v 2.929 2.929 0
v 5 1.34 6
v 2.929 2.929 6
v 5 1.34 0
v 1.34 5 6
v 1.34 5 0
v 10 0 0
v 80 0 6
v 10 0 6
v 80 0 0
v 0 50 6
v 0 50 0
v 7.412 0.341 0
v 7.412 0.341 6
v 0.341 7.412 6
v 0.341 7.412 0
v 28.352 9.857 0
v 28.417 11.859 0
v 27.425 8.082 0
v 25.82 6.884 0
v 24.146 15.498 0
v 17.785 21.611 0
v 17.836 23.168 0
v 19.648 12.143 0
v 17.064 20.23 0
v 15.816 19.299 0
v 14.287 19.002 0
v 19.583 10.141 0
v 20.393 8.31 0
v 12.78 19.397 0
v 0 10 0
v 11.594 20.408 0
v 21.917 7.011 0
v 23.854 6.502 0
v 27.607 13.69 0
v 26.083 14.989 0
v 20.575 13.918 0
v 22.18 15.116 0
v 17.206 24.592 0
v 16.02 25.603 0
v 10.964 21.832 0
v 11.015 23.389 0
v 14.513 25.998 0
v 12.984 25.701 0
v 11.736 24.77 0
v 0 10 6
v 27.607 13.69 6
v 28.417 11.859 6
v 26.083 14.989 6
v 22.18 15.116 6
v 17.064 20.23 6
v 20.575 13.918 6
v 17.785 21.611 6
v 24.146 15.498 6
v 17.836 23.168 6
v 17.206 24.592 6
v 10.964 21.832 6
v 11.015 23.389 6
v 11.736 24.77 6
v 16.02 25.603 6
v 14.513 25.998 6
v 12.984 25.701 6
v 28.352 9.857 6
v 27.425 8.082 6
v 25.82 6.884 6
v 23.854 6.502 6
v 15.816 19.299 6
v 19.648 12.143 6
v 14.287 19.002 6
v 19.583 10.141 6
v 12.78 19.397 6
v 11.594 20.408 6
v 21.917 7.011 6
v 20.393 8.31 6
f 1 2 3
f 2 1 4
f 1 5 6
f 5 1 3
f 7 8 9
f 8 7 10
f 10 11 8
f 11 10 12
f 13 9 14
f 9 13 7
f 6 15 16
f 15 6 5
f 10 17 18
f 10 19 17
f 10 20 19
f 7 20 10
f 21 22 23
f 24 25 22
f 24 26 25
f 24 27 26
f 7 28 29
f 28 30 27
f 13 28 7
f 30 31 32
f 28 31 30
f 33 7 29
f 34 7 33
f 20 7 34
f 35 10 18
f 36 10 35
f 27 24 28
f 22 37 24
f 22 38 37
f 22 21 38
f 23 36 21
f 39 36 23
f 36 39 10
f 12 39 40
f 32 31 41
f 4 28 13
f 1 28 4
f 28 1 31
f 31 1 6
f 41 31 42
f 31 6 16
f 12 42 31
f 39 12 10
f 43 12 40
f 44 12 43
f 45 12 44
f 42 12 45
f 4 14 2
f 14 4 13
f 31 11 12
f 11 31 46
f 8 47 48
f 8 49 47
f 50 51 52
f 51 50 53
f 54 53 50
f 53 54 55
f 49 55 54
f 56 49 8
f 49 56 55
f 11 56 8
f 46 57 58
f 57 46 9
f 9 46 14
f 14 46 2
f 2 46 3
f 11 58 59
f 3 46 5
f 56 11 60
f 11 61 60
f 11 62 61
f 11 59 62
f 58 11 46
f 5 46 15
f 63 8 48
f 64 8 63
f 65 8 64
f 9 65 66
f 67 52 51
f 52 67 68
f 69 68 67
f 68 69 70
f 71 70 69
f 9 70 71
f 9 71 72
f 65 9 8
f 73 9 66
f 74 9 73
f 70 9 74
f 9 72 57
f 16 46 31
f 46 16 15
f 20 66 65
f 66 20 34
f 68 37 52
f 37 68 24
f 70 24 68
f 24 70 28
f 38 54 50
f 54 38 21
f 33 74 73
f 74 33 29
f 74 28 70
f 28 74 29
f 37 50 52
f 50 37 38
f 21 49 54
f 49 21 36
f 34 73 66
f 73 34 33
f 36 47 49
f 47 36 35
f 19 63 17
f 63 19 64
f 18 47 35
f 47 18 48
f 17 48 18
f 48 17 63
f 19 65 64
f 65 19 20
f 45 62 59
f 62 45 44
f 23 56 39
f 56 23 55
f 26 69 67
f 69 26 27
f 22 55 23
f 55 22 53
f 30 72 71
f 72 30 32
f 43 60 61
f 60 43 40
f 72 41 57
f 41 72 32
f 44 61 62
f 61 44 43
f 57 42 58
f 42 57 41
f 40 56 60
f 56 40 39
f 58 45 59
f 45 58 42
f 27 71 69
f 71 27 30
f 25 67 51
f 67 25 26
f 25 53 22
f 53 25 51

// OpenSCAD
$fn = 32;

// ----------------------------------------------------------------------
// Bracket plate: corner pad 80 x 50, fillet R10
// ----------------------------------------------------------------------

// --- parameters (mm) ---
hole_r = 3.5;             // bolt hole radius
plate_t = 6;              // plate thickness, Z (extrusion height)
leg_a = 80;               // base leg
leg_b = 50;               // height leg
fillet_r = 10;            // right-angle fillet radius

hole_d1 = 2 * hole_r + 2;
hole_d2 = 2 * hole_r;

profile = [[10, 0], [80, 0], [0, 50], [0, 10], [0.341, 7.412], [1.34, 5], [2.929, 2.929], [5, 1.34], [7.412, 0.341]];  // primary outline, 9 points, counter clockwise
void_1 = [[28.417, 11.859], [27.607, 13.69], [26.083, 14.989], [24.146, 15.498], [22.18, 15.116], [20.575, 13.918], [19.648, 12.143], [19.583, 10.141], [20.393, 8.31], [21.917, 7.011], [23.854, 6.502], [25.82, 6.884], [27.425, 8.082], [28.352, 9.857]];  // mount hole 1, 14 points
void_2 = [[17.836, 23.168], [17.206, 24.592], [16.02, 25.603], [14.513, 25.998], [12.984, 25.701], [11.736, 24.77], [11.015, 23.389], [10.964, 21.832], [11.594, 20.408], [12.78, 19.397], [14.287, 19.002], [15.816, 19.299], [17.064, 20.23], [17.785, 21.611]];  // mount hole 2, 14 points

// --- the one profile operation ---
difference() {
  linear_extrude(height = plate_t) polygon(points = profile);
  translate([0, 0, -1])
    linear_extrude(height = plate_t + 2) polygon(points = void_1);
  translate([0, 0, -1])
    linear_extrude(height = plate_t + 2) polygon(points = void_2);
}
